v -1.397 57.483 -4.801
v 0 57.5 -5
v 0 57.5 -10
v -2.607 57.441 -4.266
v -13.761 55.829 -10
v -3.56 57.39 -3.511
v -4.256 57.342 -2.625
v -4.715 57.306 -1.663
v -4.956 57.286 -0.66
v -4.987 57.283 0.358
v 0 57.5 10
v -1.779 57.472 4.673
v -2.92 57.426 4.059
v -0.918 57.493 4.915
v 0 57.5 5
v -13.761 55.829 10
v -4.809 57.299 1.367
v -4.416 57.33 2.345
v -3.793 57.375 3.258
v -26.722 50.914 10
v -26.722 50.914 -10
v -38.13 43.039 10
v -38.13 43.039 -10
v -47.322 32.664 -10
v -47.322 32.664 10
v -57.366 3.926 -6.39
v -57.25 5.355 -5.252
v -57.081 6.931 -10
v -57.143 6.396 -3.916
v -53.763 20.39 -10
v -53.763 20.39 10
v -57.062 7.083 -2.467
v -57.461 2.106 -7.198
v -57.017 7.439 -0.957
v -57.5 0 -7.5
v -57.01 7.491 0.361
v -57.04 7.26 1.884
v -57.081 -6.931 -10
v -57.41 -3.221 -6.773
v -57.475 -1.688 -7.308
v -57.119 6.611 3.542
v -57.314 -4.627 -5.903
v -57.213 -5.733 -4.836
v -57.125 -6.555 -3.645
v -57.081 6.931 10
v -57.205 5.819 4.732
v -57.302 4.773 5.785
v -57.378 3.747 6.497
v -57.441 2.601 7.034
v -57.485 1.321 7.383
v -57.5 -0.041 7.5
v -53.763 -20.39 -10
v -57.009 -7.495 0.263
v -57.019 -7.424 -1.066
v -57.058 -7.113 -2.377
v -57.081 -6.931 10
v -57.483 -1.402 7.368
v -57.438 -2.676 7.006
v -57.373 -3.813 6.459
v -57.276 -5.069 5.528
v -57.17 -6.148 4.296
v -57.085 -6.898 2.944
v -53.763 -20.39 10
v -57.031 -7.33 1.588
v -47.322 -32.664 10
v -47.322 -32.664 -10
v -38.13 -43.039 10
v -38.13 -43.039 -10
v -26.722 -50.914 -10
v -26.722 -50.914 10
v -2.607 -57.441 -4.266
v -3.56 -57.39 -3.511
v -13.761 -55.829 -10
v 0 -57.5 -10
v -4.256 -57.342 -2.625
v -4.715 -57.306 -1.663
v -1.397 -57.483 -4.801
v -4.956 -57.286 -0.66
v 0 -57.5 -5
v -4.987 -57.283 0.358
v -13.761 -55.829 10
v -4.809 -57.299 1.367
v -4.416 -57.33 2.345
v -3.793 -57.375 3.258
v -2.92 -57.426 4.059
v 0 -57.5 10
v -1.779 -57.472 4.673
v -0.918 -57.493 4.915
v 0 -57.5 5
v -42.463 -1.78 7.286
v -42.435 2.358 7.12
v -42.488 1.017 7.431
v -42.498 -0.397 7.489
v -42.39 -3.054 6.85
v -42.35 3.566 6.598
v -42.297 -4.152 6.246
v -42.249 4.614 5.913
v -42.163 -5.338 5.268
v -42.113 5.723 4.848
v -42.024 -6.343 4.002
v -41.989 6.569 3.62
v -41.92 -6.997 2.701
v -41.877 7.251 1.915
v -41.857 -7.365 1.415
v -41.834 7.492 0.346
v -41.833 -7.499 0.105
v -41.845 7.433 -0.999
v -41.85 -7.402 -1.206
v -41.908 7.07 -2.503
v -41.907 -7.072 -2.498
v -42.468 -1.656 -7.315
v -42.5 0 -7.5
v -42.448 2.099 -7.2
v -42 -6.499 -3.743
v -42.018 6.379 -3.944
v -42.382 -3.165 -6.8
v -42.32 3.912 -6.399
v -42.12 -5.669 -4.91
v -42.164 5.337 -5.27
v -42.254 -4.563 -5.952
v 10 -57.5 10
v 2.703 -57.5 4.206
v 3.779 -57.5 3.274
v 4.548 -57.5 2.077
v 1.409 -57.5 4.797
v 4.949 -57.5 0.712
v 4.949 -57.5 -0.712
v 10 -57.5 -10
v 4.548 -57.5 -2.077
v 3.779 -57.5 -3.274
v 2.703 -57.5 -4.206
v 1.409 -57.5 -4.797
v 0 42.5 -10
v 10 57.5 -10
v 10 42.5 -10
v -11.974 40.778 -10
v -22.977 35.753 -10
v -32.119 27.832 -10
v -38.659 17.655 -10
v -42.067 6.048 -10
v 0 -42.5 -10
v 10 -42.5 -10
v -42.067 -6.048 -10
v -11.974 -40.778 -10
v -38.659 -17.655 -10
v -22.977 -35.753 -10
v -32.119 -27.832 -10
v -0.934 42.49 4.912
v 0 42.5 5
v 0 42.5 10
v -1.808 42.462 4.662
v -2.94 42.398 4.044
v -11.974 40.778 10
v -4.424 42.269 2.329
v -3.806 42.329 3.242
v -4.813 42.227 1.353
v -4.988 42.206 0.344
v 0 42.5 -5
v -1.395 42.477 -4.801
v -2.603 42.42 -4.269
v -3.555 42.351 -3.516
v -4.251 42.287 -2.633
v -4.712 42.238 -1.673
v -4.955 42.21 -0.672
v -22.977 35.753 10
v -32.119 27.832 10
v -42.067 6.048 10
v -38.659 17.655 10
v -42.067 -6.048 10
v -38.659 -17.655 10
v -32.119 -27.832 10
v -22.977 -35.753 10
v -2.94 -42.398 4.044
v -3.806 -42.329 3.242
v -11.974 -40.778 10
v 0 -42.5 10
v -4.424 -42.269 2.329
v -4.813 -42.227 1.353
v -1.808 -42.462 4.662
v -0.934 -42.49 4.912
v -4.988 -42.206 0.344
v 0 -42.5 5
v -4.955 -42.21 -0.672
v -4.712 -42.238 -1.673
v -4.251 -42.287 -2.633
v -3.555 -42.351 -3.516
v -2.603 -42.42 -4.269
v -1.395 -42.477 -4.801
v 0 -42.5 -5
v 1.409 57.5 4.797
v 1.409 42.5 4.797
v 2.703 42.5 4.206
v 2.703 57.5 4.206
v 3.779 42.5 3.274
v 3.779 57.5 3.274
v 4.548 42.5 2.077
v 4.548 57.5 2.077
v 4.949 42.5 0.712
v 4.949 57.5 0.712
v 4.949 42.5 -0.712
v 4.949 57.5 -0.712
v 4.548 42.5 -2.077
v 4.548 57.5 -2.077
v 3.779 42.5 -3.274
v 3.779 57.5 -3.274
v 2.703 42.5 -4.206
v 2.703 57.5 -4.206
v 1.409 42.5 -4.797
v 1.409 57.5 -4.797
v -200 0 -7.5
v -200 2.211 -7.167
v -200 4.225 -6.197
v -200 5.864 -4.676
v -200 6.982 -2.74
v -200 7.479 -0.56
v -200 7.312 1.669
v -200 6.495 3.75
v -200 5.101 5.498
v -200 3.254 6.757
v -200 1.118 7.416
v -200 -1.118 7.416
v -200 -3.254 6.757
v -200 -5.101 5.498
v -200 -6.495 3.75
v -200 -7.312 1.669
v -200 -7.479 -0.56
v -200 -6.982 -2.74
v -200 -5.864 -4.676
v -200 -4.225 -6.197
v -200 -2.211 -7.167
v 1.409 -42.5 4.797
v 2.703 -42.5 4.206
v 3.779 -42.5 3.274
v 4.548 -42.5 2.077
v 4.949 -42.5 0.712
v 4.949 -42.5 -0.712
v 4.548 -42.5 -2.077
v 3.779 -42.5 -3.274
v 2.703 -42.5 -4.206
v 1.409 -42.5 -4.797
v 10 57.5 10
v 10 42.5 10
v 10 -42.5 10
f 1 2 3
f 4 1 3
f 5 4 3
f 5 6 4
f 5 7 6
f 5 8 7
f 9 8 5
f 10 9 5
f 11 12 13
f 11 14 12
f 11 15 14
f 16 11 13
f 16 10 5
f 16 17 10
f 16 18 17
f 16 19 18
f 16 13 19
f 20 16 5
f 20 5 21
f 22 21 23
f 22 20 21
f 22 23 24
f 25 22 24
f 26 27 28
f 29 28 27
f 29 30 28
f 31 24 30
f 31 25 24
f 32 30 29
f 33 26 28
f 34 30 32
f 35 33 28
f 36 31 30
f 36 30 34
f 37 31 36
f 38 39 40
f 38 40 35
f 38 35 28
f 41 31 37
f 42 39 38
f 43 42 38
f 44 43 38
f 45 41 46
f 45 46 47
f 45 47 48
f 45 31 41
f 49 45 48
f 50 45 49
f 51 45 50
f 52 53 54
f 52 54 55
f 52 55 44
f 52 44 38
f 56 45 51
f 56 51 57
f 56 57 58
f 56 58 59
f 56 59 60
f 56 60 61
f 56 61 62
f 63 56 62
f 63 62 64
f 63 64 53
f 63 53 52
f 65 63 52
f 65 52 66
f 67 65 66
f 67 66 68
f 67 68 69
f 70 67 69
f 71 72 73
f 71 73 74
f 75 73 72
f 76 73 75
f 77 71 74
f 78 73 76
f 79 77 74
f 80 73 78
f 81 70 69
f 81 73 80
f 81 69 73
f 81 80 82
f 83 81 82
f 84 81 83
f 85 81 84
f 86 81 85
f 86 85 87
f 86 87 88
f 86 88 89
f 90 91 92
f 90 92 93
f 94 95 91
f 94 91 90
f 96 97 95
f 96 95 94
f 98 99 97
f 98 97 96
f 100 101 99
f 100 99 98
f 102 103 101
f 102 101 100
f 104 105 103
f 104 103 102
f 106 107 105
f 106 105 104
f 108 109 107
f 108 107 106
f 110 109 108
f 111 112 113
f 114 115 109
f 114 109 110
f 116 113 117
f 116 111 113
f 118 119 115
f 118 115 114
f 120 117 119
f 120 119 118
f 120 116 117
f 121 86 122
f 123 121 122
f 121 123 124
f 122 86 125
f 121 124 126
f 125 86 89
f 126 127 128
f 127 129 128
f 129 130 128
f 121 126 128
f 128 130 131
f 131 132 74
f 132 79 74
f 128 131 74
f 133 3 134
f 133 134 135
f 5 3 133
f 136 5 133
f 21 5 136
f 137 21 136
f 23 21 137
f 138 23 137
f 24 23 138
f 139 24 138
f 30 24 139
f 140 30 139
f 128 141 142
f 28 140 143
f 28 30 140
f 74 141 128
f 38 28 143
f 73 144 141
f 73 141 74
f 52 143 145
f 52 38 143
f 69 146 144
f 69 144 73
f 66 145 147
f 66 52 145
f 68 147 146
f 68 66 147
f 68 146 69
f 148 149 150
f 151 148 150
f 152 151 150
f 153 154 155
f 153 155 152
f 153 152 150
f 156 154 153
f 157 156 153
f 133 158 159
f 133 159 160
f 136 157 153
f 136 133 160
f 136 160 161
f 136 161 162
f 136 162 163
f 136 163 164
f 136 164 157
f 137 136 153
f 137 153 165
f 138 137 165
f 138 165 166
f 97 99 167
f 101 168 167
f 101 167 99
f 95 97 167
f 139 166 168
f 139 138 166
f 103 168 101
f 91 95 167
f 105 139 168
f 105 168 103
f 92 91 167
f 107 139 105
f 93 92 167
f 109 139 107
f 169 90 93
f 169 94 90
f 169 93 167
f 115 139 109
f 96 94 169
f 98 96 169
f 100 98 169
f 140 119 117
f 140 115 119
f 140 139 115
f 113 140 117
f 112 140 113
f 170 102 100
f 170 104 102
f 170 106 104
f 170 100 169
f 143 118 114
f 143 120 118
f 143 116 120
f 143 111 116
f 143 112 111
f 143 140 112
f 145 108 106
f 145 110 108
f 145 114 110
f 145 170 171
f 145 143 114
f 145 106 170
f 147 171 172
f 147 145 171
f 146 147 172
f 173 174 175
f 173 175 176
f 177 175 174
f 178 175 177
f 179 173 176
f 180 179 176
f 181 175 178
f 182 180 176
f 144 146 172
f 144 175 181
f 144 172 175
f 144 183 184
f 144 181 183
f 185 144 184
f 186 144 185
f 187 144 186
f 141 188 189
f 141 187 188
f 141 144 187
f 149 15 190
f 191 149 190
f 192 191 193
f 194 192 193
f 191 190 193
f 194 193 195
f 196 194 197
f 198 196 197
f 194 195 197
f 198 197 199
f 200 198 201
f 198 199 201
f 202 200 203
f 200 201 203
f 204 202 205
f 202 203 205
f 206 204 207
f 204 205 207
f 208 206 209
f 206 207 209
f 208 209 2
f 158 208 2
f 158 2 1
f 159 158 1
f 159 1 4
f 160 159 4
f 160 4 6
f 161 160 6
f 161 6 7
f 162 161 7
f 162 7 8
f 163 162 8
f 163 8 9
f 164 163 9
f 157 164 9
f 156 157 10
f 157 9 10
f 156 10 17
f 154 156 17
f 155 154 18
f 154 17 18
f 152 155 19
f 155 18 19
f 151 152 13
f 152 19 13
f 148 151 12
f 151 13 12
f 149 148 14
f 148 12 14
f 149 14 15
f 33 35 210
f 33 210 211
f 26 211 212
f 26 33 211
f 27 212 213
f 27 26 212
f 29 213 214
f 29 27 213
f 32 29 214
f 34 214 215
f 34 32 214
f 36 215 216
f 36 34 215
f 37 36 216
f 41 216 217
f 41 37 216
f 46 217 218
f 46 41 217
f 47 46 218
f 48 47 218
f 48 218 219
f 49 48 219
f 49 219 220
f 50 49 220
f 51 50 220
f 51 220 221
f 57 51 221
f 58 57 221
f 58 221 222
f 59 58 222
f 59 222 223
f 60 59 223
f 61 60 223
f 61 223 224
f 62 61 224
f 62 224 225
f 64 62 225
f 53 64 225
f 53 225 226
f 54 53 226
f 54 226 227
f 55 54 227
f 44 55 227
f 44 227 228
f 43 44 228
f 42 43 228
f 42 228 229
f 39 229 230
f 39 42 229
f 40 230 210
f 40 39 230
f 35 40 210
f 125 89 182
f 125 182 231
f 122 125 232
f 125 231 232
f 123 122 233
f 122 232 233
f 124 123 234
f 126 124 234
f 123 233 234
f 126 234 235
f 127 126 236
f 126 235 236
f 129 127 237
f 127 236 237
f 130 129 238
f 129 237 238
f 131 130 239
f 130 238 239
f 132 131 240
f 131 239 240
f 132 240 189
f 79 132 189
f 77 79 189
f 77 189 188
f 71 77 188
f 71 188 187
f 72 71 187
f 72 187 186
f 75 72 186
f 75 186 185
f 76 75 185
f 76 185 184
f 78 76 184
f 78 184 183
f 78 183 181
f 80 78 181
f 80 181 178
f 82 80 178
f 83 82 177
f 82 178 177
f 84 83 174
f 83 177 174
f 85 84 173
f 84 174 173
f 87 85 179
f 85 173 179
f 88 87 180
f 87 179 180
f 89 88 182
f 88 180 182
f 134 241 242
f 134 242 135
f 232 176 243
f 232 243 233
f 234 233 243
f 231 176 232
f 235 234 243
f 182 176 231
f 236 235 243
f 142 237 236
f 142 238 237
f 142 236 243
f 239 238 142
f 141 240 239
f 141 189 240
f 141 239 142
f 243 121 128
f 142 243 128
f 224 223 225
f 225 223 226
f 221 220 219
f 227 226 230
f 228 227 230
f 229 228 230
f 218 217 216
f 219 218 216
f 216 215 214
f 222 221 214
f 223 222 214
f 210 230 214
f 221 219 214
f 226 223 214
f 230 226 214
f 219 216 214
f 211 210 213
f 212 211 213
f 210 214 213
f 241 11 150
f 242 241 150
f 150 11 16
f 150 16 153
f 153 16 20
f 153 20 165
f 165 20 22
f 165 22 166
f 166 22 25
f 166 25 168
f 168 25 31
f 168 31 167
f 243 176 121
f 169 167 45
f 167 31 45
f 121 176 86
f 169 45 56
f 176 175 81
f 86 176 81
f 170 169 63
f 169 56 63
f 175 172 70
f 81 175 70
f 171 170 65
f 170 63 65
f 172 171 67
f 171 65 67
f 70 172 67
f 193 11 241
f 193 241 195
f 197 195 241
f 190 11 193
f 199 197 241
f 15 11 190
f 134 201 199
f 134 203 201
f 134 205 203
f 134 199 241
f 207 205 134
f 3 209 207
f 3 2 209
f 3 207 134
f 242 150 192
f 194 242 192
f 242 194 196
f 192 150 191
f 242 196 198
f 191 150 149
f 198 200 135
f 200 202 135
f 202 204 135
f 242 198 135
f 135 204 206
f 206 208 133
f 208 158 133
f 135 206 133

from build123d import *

# Parameters (mm, degrees)
CROQUIS2_R              = 7.5
SALIENTE_EXTRUIR1_DEPTH = 200
CROQUIS3_W              = 20
CROQUIS3_H              = 15
CORTAR_EXTRUIR1_START   = -100
CROQUIS5_R              = 42.5
CORTAR_EXTRUIR1_DEPTH   = 100
CROQUIS6_W              = 20
CROQUIS6_H              = 15
SALIENTE_EXTRUIR2_DEPTH = 10
CROQUIS8_R              = 5
CORTAR_EXTRUIR2_DEPTH   = 231.922064916


with BuildPart() as part:
    # Croquis2 → Saliente-Extruir1 (new body)
    with BuildSketch(Plane(origin=(0, 0, 0), x_dir=(0, 0, -1), z_dir=(1, 0, 0))):
        Circle(CROQUIS2_R)
    extrude(amount=-SALIENTE_EXTRUIR1_DEPTH)

    # Barrer1: sweep along a path in Croquis4
    with BuildLine(Plane.XY) as barrer1_path:
        ThreePointArc((0, 50), (-50, 0), (0, -50))
    # Croquis3 → Barrer1 (sweep)
    with BuildSketch(Plane(origin=(0, 0, 0), x_dir=(0, 0, -1), z_dir=(1, 0, 0))):
        with Locations((0, 50)):
            Rectangle(CROQUIS3_W, CROQUIS3_H)
    sweep(path=barrer1_path.line)

    # Croquis5 → Cortar-Extruir1 (cut)
    with BuildSketch(Plane.XY.offset(10).offset(CORTAR_EXTRUIR1_START)):
        Circle(CROQUIS5_R)
    extrude(amount=CORTAR_EXTRUIR1_DEPTH, mode=Mode.SUBTRACT)

    # Croquis6 → Saliente-Extruir2 (add)
    with BuildSketch(Plane(origin=(0, 0, 0), x_dir=(0, 0, -1), z_dir=(1, 0, 0))):
        with Locations((0, 50)):
            Rectangle(CROQUIS6_W, CROQUIS6_H)
    saliente_extruir2 = extrude(amount=SALIENTE_EXTRUIR2_DEPTH)

    # Simetría1: Saliente-Extruir2 across plane
    add(saliente_extruir2.mirror(Plane.ZX))

    # Croquis8 → Cortar-Extruir2 (cut, through all)
    with BuildSketch(Plane(origin=(0, 57.5, 0), x_dir=(1, 0, 0), z_dir=(0, 1, 0))):
        with Locations(Location((0, 0, 0), (0, 0, 270))):
            Circle(CROQUIS8_R)
    extrude(amount=-CORTAR_EXTRUIR2_DEPTH, mode=Mode.SUBTRACT)


solid = part.part
